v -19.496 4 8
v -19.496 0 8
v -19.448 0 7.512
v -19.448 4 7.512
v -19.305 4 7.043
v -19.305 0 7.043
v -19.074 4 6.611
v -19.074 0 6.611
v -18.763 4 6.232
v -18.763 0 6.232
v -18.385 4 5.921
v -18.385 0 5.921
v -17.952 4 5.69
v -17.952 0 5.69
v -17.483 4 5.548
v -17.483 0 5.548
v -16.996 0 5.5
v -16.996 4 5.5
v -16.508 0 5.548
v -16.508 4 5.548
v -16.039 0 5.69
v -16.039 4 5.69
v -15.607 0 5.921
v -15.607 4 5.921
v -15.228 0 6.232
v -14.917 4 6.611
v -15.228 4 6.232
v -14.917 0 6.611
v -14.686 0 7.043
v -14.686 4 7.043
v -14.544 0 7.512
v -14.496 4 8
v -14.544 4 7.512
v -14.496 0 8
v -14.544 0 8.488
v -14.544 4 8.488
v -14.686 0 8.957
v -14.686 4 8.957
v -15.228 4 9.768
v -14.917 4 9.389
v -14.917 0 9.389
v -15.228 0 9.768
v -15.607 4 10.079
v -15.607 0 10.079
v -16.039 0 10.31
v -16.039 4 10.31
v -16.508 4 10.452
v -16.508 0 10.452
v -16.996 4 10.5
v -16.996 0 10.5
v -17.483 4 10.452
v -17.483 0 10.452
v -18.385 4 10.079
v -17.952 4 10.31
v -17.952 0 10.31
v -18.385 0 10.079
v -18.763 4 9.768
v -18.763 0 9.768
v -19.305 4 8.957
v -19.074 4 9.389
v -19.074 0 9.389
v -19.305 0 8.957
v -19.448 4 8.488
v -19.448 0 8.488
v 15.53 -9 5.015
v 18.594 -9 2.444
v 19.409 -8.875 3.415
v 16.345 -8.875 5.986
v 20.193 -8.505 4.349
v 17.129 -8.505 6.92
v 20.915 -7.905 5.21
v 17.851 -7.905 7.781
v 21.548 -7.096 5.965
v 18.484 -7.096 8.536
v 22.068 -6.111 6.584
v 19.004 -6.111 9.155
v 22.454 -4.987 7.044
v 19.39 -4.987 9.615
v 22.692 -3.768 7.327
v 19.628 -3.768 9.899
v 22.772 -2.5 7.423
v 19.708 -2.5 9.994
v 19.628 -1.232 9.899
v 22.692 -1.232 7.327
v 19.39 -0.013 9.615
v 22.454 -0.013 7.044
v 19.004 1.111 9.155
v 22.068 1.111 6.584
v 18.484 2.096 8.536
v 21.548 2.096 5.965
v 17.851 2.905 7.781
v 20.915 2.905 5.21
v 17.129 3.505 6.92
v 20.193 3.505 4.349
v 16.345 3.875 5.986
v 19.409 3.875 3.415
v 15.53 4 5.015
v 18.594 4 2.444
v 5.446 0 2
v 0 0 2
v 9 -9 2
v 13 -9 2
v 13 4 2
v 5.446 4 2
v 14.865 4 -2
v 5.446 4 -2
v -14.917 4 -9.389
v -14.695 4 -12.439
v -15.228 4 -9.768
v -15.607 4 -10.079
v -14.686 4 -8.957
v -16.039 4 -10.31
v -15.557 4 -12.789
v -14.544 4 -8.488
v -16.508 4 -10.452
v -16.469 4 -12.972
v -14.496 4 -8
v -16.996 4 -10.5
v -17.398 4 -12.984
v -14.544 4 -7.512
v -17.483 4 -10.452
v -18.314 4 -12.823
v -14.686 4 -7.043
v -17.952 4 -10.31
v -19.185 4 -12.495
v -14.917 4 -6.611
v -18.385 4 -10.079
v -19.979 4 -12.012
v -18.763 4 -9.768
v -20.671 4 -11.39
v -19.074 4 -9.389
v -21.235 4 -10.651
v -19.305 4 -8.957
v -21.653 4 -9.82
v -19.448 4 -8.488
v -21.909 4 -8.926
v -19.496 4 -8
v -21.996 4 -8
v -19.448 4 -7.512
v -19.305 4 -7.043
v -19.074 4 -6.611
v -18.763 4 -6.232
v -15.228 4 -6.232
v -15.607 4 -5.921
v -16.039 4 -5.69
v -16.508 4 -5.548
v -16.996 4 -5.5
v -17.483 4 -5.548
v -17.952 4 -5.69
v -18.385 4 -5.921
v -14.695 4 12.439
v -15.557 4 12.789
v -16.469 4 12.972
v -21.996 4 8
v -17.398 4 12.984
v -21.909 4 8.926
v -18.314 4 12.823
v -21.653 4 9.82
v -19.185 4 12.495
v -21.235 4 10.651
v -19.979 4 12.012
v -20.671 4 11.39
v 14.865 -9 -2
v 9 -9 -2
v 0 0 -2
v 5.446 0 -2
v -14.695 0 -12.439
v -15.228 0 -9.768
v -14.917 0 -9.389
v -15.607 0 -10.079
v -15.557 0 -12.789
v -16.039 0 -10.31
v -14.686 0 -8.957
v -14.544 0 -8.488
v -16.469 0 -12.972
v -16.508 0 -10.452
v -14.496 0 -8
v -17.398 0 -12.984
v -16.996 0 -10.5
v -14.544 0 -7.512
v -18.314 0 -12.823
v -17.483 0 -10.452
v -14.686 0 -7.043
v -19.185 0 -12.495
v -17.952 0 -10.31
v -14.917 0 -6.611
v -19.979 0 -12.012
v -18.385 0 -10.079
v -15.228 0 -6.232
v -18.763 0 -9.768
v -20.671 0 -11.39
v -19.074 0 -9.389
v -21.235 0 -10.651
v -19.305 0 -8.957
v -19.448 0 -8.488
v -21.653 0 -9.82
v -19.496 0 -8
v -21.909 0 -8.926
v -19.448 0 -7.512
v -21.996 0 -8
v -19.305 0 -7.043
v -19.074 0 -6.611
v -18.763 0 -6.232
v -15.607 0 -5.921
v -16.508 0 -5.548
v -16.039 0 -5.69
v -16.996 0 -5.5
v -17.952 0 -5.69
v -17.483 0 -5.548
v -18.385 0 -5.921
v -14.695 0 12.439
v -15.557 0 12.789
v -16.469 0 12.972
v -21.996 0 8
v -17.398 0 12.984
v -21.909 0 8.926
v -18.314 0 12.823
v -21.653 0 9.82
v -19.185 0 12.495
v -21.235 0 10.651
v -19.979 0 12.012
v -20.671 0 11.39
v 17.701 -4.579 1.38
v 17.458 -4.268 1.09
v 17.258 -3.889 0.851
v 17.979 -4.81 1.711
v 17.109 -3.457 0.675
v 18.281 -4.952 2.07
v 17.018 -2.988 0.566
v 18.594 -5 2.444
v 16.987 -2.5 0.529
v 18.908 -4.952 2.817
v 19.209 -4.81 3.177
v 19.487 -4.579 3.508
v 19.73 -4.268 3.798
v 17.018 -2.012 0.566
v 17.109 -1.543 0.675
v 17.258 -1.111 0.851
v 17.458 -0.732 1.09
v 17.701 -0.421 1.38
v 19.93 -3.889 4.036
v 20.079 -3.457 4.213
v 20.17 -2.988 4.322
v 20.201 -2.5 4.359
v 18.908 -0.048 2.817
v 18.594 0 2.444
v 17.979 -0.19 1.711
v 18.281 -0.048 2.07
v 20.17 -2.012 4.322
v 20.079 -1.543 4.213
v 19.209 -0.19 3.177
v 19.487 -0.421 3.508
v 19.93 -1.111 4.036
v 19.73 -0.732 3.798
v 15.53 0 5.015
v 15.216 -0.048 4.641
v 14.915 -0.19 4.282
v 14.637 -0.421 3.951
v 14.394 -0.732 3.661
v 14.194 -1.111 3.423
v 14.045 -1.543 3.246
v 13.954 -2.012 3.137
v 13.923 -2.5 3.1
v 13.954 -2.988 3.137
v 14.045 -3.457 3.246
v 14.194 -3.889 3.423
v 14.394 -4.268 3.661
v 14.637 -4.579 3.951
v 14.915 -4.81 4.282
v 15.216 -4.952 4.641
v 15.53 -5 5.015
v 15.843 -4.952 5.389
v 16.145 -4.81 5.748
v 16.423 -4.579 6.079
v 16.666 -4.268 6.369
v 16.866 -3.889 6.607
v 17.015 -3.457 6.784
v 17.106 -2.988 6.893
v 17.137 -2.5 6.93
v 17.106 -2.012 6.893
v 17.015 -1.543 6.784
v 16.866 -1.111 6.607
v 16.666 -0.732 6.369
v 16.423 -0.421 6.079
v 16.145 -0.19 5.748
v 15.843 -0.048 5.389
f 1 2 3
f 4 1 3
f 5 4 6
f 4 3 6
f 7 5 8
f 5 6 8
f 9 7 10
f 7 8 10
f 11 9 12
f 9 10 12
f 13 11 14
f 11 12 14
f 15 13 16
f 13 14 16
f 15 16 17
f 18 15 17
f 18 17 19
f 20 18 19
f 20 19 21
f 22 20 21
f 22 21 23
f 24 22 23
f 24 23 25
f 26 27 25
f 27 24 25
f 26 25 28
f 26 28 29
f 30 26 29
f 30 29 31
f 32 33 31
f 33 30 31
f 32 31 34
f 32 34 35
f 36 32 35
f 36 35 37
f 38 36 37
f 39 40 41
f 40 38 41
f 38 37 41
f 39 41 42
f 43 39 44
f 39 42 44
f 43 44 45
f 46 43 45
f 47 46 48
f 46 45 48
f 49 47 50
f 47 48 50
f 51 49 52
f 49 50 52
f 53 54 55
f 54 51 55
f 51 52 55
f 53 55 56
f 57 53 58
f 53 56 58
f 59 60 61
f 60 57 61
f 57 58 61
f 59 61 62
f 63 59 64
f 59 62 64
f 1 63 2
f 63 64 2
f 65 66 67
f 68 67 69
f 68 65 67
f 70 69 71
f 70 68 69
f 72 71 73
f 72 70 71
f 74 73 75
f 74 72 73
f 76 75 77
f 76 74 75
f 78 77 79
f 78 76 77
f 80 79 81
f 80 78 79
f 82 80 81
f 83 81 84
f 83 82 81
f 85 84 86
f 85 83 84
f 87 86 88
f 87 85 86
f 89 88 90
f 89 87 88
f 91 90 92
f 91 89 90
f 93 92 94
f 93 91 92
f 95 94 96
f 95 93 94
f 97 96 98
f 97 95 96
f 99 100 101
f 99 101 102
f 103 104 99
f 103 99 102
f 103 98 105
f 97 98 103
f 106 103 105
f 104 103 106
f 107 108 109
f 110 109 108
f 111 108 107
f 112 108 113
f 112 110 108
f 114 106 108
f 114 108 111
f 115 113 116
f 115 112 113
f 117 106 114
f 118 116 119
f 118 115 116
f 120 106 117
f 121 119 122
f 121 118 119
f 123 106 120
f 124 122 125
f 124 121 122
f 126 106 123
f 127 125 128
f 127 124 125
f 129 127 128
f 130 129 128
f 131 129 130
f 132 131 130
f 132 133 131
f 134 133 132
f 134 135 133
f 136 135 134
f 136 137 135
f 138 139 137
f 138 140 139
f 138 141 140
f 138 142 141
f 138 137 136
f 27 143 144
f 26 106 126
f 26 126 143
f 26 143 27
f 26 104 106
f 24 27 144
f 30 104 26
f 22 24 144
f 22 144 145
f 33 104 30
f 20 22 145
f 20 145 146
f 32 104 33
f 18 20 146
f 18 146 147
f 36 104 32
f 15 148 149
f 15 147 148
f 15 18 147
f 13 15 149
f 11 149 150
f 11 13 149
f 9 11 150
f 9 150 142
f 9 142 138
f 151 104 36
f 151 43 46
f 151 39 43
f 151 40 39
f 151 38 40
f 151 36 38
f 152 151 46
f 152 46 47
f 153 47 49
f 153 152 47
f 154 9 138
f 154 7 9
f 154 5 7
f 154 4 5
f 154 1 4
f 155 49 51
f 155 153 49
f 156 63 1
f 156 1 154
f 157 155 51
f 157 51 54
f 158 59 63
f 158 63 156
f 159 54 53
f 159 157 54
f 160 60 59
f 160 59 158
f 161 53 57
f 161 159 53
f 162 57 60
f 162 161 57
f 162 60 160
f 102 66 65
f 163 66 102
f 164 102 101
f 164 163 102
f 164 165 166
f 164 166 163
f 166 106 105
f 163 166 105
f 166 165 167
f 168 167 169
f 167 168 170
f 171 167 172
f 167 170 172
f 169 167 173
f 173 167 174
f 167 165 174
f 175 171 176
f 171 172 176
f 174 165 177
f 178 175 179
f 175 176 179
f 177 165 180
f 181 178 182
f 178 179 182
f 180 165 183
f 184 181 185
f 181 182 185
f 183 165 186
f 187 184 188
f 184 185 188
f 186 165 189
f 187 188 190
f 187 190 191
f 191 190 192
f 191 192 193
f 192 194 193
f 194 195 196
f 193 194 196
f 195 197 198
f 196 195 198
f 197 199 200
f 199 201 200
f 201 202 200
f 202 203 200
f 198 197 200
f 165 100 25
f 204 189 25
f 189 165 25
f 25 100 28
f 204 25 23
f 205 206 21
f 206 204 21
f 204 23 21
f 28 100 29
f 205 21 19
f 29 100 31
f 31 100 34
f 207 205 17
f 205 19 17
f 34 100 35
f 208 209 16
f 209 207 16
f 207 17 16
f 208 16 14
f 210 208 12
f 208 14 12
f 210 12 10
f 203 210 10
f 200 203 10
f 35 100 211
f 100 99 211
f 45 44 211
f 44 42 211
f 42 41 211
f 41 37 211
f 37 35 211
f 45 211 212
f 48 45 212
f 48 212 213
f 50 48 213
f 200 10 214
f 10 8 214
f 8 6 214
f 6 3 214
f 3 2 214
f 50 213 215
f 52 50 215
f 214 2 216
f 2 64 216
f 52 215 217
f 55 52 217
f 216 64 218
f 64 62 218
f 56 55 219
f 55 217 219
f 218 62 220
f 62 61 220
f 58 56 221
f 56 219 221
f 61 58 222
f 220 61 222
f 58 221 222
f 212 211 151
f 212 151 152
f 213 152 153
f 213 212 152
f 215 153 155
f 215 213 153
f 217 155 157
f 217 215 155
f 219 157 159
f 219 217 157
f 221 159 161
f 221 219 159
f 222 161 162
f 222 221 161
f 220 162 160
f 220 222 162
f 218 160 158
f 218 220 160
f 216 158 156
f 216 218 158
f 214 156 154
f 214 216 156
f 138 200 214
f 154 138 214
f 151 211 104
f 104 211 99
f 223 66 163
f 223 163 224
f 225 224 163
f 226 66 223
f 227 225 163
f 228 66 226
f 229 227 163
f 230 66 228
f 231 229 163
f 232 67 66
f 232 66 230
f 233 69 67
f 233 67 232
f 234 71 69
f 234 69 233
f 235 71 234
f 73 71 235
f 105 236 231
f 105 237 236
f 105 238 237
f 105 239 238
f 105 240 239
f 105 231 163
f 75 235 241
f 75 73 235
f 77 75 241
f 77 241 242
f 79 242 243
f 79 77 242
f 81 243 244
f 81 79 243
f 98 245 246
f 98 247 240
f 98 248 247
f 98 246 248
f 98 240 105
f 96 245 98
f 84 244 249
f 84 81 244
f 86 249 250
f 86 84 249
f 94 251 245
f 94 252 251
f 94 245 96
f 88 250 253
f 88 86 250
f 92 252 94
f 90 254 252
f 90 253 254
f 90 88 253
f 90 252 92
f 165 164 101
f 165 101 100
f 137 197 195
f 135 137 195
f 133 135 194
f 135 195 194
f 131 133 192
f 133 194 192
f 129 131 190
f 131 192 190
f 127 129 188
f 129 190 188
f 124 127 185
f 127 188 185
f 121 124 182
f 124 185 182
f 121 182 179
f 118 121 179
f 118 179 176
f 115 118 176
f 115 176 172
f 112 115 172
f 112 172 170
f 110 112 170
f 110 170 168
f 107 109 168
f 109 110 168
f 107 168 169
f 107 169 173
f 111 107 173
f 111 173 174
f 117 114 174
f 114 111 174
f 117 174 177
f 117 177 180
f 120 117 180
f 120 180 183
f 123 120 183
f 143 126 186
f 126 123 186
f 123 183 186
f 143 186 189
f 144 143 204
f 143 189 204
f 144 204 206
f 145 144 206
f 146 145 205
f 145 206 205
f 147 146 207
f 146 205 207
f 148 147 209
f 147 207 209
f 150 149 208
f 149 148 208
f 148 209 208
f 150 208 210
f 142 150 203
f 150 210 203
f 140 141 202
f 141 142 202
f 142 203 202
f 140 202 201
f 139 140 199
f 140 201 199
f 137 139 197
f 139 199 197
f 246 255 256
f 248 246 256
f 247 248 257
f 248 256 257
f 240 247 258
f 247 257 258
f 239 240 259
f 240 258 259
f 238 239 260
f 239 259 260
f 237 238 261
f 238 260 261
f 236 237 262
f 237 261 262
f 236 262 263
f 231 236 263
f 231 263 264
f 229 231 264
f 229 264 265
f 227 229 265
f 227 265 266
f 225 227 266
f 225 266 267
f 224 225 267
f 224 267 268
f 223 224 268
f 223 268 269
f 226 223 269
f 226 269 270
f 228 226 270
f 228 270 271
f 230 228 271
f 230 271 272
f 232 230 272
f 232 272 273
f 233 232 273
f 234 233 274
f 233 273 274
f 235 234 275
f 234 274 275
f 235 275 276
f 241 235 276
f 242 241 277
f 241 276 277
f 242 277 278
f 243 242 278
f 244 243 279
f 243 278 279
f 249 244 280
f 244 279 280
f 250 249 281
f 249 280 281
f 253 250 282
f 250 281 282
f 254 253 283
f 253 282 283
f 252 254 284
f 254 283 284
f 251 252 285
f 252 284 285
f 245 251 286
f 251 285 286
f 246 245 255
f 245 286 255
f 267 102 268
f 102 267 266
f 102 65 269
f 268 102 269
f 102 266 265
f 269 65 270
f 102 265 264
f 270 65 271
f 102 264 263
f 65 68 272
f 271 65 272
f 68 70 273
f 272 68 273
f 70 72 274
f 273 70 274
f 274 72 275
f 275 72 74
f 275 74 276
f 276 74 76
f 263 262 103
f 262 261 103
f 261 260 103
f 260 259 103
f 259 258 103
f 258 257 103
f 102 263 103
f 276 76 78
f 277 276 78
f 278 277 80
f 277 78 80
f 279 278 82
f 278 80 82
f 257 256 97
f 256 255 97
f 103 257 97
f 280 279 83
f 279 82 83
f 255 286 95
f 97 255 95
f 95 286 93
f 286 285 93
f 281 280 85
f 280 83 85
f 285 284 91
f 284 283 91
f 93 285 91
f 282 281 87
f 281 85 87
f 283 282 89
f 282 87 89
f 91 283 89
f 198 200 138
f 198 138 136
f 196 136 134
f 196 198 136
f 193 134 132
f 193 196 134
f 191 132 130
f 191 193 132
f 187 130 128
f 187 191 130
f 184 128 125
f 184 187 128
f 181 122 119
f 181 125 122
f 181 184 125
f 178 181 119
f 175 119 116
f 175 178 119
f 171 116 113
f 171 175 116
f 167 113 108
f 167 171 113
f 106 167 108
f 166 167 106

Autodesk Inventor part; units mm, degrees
ref_plane "YZ Plane" through (0, 0, 0) normal (1, 0, 0) x (0, 1, 0)
ref_plane "XZ Plane" through (0, 0, 0) normal (0, 1, 0) x (-1, 0, 0)
sketch "草图1" plane through (0, 0, 0) normal (0, 1, 0) x (-1, 0, 0)
  line L0 (55.5004, 0) -> (-70.183, 0)
  line L1 (21.9957, -8) -> (21.9957, 8)
  line L2 (14.6949, 12.4392) -> (-9.3051, 0)
  line L3 (14.6949, -12.4392) -> (-9.3051, 0)
  arc A0 (14.6949, -12.4392) -> (21.9957, -8) centre (16.9957, -8) ccw
  arc A1 (21.9957, 8) -> (14.6949, 12.4392) centre (16.9957, 8) ccw
  circle A2 centre (16.9957, -8) radius 2.5
  circle A3 centre (16.9957, 8) radius 2.5
  point P0 (0, 0)
  dimension "d0" = 5
  dimension "d1" = 16
  dimension "d2" = 24
  dimension "d3" = 5
  dimension "d4" = 5
extrude "拉伸1" add sketch "草图1" along normal blind 4
sketch "草图2" plane through (0, 0, 0) normal (0, 0, 1) x (1, 0, 0)
  line L0 (9.3051, 0) -> (-14.6949, 0) projected
  line L1 (9.3051, 0) -> (9.3051, 4) projected
  line L2 (-14.6949, 4) -> (9.3051, 4) projected
  line L3 (-14.6949, 0) -> (-14.6949, 4) projected
  line L4 (0, 4) -> (13, 4)
  line L5 (13, 4) -> (13, -9)
  line L6 (13, -9) -> (9, -9)
  line L7 (9, -9) -> (0, 0)
  line L8 (0, 0) -> (0, 4)
  dimension "d7" = 13
  dimension "d8" = 13
  dimension "d9" = 4
extrude "拉伸2" add sketch "草图2" along normal mid plane 4 contours L1 L4 L5 L6 L7 L0 | L0 L8 L2 L1
ref_plane "工作平面1" through (13, -9, 2) normal (0.7660444, 0, -0.6427876) x (0, 1, 0)
sketch "草图3" plane through (13, -9, 2) normal (0.7660444, 0, -0.6427876) x (0, 1, 0)
  line L0 (13, -3.0642) -> (13, 0) projected
  line L1 (0, 0) -> (13, 0) projected
  line L2 (0, -3.0642) -> (0, 0) projected
  line L3 (13, -3.0642) -> (0, -3.0642) projected
  line L4 (9, -7.9196) -> (9, -11.4204) projected
  line L5 (13, -7.9196) -> (9, -7.9196) projected
  line L6 (13, -7.9196) -> (13, -3.0642) projected
  line L7 (13, -3.0642) -> (0, -3.0642) projected
  line L8 (0, -3.0642) -> (0, -5.6353) projected
  line L9 (0, -5.6353) -> (9, -11.4204) projected
  line L10 (0, -3.0642) -> (13, -3.0642)
  line L11 (13, -3.0642) -> (13, 3.9358)
  line L12 (0, 3.9358) -> (0, -3.0642)
  arc A0 (13, 3.9358) -> (0, 3.9358) centre (6.5, 3.9358) ccw
  circle A1 centre (6.5, 3.9358) radius 2.5
  point P0 (9, -9.8883)
  dimension "d13" = 6.5
  dimension "d14" = 7
  dimension "d15" = 5
extrude "拉伸3" add sketch "草图3" along normal blind 4 contours L3 L2 L1 L0 | L1 L12 A0 L11
sketch "草图4" plane through (0, 4, 0) normal (0, 1, 0) x (1, 0, 0)
  line L0 (13, -2) -> (5.4463, -2) projected
  line L1 (14.0946, 2.9184) -> (18.5941, -2.4439) projected
  line L2 (13, 2) -> (14.0946, 2.9184) projected
  line L3 (13, 2) -> (14.8652, 2)
  point P0 (0, 0)
extrude "拉伸4" cut sketch "草图4" against normal blind 20
